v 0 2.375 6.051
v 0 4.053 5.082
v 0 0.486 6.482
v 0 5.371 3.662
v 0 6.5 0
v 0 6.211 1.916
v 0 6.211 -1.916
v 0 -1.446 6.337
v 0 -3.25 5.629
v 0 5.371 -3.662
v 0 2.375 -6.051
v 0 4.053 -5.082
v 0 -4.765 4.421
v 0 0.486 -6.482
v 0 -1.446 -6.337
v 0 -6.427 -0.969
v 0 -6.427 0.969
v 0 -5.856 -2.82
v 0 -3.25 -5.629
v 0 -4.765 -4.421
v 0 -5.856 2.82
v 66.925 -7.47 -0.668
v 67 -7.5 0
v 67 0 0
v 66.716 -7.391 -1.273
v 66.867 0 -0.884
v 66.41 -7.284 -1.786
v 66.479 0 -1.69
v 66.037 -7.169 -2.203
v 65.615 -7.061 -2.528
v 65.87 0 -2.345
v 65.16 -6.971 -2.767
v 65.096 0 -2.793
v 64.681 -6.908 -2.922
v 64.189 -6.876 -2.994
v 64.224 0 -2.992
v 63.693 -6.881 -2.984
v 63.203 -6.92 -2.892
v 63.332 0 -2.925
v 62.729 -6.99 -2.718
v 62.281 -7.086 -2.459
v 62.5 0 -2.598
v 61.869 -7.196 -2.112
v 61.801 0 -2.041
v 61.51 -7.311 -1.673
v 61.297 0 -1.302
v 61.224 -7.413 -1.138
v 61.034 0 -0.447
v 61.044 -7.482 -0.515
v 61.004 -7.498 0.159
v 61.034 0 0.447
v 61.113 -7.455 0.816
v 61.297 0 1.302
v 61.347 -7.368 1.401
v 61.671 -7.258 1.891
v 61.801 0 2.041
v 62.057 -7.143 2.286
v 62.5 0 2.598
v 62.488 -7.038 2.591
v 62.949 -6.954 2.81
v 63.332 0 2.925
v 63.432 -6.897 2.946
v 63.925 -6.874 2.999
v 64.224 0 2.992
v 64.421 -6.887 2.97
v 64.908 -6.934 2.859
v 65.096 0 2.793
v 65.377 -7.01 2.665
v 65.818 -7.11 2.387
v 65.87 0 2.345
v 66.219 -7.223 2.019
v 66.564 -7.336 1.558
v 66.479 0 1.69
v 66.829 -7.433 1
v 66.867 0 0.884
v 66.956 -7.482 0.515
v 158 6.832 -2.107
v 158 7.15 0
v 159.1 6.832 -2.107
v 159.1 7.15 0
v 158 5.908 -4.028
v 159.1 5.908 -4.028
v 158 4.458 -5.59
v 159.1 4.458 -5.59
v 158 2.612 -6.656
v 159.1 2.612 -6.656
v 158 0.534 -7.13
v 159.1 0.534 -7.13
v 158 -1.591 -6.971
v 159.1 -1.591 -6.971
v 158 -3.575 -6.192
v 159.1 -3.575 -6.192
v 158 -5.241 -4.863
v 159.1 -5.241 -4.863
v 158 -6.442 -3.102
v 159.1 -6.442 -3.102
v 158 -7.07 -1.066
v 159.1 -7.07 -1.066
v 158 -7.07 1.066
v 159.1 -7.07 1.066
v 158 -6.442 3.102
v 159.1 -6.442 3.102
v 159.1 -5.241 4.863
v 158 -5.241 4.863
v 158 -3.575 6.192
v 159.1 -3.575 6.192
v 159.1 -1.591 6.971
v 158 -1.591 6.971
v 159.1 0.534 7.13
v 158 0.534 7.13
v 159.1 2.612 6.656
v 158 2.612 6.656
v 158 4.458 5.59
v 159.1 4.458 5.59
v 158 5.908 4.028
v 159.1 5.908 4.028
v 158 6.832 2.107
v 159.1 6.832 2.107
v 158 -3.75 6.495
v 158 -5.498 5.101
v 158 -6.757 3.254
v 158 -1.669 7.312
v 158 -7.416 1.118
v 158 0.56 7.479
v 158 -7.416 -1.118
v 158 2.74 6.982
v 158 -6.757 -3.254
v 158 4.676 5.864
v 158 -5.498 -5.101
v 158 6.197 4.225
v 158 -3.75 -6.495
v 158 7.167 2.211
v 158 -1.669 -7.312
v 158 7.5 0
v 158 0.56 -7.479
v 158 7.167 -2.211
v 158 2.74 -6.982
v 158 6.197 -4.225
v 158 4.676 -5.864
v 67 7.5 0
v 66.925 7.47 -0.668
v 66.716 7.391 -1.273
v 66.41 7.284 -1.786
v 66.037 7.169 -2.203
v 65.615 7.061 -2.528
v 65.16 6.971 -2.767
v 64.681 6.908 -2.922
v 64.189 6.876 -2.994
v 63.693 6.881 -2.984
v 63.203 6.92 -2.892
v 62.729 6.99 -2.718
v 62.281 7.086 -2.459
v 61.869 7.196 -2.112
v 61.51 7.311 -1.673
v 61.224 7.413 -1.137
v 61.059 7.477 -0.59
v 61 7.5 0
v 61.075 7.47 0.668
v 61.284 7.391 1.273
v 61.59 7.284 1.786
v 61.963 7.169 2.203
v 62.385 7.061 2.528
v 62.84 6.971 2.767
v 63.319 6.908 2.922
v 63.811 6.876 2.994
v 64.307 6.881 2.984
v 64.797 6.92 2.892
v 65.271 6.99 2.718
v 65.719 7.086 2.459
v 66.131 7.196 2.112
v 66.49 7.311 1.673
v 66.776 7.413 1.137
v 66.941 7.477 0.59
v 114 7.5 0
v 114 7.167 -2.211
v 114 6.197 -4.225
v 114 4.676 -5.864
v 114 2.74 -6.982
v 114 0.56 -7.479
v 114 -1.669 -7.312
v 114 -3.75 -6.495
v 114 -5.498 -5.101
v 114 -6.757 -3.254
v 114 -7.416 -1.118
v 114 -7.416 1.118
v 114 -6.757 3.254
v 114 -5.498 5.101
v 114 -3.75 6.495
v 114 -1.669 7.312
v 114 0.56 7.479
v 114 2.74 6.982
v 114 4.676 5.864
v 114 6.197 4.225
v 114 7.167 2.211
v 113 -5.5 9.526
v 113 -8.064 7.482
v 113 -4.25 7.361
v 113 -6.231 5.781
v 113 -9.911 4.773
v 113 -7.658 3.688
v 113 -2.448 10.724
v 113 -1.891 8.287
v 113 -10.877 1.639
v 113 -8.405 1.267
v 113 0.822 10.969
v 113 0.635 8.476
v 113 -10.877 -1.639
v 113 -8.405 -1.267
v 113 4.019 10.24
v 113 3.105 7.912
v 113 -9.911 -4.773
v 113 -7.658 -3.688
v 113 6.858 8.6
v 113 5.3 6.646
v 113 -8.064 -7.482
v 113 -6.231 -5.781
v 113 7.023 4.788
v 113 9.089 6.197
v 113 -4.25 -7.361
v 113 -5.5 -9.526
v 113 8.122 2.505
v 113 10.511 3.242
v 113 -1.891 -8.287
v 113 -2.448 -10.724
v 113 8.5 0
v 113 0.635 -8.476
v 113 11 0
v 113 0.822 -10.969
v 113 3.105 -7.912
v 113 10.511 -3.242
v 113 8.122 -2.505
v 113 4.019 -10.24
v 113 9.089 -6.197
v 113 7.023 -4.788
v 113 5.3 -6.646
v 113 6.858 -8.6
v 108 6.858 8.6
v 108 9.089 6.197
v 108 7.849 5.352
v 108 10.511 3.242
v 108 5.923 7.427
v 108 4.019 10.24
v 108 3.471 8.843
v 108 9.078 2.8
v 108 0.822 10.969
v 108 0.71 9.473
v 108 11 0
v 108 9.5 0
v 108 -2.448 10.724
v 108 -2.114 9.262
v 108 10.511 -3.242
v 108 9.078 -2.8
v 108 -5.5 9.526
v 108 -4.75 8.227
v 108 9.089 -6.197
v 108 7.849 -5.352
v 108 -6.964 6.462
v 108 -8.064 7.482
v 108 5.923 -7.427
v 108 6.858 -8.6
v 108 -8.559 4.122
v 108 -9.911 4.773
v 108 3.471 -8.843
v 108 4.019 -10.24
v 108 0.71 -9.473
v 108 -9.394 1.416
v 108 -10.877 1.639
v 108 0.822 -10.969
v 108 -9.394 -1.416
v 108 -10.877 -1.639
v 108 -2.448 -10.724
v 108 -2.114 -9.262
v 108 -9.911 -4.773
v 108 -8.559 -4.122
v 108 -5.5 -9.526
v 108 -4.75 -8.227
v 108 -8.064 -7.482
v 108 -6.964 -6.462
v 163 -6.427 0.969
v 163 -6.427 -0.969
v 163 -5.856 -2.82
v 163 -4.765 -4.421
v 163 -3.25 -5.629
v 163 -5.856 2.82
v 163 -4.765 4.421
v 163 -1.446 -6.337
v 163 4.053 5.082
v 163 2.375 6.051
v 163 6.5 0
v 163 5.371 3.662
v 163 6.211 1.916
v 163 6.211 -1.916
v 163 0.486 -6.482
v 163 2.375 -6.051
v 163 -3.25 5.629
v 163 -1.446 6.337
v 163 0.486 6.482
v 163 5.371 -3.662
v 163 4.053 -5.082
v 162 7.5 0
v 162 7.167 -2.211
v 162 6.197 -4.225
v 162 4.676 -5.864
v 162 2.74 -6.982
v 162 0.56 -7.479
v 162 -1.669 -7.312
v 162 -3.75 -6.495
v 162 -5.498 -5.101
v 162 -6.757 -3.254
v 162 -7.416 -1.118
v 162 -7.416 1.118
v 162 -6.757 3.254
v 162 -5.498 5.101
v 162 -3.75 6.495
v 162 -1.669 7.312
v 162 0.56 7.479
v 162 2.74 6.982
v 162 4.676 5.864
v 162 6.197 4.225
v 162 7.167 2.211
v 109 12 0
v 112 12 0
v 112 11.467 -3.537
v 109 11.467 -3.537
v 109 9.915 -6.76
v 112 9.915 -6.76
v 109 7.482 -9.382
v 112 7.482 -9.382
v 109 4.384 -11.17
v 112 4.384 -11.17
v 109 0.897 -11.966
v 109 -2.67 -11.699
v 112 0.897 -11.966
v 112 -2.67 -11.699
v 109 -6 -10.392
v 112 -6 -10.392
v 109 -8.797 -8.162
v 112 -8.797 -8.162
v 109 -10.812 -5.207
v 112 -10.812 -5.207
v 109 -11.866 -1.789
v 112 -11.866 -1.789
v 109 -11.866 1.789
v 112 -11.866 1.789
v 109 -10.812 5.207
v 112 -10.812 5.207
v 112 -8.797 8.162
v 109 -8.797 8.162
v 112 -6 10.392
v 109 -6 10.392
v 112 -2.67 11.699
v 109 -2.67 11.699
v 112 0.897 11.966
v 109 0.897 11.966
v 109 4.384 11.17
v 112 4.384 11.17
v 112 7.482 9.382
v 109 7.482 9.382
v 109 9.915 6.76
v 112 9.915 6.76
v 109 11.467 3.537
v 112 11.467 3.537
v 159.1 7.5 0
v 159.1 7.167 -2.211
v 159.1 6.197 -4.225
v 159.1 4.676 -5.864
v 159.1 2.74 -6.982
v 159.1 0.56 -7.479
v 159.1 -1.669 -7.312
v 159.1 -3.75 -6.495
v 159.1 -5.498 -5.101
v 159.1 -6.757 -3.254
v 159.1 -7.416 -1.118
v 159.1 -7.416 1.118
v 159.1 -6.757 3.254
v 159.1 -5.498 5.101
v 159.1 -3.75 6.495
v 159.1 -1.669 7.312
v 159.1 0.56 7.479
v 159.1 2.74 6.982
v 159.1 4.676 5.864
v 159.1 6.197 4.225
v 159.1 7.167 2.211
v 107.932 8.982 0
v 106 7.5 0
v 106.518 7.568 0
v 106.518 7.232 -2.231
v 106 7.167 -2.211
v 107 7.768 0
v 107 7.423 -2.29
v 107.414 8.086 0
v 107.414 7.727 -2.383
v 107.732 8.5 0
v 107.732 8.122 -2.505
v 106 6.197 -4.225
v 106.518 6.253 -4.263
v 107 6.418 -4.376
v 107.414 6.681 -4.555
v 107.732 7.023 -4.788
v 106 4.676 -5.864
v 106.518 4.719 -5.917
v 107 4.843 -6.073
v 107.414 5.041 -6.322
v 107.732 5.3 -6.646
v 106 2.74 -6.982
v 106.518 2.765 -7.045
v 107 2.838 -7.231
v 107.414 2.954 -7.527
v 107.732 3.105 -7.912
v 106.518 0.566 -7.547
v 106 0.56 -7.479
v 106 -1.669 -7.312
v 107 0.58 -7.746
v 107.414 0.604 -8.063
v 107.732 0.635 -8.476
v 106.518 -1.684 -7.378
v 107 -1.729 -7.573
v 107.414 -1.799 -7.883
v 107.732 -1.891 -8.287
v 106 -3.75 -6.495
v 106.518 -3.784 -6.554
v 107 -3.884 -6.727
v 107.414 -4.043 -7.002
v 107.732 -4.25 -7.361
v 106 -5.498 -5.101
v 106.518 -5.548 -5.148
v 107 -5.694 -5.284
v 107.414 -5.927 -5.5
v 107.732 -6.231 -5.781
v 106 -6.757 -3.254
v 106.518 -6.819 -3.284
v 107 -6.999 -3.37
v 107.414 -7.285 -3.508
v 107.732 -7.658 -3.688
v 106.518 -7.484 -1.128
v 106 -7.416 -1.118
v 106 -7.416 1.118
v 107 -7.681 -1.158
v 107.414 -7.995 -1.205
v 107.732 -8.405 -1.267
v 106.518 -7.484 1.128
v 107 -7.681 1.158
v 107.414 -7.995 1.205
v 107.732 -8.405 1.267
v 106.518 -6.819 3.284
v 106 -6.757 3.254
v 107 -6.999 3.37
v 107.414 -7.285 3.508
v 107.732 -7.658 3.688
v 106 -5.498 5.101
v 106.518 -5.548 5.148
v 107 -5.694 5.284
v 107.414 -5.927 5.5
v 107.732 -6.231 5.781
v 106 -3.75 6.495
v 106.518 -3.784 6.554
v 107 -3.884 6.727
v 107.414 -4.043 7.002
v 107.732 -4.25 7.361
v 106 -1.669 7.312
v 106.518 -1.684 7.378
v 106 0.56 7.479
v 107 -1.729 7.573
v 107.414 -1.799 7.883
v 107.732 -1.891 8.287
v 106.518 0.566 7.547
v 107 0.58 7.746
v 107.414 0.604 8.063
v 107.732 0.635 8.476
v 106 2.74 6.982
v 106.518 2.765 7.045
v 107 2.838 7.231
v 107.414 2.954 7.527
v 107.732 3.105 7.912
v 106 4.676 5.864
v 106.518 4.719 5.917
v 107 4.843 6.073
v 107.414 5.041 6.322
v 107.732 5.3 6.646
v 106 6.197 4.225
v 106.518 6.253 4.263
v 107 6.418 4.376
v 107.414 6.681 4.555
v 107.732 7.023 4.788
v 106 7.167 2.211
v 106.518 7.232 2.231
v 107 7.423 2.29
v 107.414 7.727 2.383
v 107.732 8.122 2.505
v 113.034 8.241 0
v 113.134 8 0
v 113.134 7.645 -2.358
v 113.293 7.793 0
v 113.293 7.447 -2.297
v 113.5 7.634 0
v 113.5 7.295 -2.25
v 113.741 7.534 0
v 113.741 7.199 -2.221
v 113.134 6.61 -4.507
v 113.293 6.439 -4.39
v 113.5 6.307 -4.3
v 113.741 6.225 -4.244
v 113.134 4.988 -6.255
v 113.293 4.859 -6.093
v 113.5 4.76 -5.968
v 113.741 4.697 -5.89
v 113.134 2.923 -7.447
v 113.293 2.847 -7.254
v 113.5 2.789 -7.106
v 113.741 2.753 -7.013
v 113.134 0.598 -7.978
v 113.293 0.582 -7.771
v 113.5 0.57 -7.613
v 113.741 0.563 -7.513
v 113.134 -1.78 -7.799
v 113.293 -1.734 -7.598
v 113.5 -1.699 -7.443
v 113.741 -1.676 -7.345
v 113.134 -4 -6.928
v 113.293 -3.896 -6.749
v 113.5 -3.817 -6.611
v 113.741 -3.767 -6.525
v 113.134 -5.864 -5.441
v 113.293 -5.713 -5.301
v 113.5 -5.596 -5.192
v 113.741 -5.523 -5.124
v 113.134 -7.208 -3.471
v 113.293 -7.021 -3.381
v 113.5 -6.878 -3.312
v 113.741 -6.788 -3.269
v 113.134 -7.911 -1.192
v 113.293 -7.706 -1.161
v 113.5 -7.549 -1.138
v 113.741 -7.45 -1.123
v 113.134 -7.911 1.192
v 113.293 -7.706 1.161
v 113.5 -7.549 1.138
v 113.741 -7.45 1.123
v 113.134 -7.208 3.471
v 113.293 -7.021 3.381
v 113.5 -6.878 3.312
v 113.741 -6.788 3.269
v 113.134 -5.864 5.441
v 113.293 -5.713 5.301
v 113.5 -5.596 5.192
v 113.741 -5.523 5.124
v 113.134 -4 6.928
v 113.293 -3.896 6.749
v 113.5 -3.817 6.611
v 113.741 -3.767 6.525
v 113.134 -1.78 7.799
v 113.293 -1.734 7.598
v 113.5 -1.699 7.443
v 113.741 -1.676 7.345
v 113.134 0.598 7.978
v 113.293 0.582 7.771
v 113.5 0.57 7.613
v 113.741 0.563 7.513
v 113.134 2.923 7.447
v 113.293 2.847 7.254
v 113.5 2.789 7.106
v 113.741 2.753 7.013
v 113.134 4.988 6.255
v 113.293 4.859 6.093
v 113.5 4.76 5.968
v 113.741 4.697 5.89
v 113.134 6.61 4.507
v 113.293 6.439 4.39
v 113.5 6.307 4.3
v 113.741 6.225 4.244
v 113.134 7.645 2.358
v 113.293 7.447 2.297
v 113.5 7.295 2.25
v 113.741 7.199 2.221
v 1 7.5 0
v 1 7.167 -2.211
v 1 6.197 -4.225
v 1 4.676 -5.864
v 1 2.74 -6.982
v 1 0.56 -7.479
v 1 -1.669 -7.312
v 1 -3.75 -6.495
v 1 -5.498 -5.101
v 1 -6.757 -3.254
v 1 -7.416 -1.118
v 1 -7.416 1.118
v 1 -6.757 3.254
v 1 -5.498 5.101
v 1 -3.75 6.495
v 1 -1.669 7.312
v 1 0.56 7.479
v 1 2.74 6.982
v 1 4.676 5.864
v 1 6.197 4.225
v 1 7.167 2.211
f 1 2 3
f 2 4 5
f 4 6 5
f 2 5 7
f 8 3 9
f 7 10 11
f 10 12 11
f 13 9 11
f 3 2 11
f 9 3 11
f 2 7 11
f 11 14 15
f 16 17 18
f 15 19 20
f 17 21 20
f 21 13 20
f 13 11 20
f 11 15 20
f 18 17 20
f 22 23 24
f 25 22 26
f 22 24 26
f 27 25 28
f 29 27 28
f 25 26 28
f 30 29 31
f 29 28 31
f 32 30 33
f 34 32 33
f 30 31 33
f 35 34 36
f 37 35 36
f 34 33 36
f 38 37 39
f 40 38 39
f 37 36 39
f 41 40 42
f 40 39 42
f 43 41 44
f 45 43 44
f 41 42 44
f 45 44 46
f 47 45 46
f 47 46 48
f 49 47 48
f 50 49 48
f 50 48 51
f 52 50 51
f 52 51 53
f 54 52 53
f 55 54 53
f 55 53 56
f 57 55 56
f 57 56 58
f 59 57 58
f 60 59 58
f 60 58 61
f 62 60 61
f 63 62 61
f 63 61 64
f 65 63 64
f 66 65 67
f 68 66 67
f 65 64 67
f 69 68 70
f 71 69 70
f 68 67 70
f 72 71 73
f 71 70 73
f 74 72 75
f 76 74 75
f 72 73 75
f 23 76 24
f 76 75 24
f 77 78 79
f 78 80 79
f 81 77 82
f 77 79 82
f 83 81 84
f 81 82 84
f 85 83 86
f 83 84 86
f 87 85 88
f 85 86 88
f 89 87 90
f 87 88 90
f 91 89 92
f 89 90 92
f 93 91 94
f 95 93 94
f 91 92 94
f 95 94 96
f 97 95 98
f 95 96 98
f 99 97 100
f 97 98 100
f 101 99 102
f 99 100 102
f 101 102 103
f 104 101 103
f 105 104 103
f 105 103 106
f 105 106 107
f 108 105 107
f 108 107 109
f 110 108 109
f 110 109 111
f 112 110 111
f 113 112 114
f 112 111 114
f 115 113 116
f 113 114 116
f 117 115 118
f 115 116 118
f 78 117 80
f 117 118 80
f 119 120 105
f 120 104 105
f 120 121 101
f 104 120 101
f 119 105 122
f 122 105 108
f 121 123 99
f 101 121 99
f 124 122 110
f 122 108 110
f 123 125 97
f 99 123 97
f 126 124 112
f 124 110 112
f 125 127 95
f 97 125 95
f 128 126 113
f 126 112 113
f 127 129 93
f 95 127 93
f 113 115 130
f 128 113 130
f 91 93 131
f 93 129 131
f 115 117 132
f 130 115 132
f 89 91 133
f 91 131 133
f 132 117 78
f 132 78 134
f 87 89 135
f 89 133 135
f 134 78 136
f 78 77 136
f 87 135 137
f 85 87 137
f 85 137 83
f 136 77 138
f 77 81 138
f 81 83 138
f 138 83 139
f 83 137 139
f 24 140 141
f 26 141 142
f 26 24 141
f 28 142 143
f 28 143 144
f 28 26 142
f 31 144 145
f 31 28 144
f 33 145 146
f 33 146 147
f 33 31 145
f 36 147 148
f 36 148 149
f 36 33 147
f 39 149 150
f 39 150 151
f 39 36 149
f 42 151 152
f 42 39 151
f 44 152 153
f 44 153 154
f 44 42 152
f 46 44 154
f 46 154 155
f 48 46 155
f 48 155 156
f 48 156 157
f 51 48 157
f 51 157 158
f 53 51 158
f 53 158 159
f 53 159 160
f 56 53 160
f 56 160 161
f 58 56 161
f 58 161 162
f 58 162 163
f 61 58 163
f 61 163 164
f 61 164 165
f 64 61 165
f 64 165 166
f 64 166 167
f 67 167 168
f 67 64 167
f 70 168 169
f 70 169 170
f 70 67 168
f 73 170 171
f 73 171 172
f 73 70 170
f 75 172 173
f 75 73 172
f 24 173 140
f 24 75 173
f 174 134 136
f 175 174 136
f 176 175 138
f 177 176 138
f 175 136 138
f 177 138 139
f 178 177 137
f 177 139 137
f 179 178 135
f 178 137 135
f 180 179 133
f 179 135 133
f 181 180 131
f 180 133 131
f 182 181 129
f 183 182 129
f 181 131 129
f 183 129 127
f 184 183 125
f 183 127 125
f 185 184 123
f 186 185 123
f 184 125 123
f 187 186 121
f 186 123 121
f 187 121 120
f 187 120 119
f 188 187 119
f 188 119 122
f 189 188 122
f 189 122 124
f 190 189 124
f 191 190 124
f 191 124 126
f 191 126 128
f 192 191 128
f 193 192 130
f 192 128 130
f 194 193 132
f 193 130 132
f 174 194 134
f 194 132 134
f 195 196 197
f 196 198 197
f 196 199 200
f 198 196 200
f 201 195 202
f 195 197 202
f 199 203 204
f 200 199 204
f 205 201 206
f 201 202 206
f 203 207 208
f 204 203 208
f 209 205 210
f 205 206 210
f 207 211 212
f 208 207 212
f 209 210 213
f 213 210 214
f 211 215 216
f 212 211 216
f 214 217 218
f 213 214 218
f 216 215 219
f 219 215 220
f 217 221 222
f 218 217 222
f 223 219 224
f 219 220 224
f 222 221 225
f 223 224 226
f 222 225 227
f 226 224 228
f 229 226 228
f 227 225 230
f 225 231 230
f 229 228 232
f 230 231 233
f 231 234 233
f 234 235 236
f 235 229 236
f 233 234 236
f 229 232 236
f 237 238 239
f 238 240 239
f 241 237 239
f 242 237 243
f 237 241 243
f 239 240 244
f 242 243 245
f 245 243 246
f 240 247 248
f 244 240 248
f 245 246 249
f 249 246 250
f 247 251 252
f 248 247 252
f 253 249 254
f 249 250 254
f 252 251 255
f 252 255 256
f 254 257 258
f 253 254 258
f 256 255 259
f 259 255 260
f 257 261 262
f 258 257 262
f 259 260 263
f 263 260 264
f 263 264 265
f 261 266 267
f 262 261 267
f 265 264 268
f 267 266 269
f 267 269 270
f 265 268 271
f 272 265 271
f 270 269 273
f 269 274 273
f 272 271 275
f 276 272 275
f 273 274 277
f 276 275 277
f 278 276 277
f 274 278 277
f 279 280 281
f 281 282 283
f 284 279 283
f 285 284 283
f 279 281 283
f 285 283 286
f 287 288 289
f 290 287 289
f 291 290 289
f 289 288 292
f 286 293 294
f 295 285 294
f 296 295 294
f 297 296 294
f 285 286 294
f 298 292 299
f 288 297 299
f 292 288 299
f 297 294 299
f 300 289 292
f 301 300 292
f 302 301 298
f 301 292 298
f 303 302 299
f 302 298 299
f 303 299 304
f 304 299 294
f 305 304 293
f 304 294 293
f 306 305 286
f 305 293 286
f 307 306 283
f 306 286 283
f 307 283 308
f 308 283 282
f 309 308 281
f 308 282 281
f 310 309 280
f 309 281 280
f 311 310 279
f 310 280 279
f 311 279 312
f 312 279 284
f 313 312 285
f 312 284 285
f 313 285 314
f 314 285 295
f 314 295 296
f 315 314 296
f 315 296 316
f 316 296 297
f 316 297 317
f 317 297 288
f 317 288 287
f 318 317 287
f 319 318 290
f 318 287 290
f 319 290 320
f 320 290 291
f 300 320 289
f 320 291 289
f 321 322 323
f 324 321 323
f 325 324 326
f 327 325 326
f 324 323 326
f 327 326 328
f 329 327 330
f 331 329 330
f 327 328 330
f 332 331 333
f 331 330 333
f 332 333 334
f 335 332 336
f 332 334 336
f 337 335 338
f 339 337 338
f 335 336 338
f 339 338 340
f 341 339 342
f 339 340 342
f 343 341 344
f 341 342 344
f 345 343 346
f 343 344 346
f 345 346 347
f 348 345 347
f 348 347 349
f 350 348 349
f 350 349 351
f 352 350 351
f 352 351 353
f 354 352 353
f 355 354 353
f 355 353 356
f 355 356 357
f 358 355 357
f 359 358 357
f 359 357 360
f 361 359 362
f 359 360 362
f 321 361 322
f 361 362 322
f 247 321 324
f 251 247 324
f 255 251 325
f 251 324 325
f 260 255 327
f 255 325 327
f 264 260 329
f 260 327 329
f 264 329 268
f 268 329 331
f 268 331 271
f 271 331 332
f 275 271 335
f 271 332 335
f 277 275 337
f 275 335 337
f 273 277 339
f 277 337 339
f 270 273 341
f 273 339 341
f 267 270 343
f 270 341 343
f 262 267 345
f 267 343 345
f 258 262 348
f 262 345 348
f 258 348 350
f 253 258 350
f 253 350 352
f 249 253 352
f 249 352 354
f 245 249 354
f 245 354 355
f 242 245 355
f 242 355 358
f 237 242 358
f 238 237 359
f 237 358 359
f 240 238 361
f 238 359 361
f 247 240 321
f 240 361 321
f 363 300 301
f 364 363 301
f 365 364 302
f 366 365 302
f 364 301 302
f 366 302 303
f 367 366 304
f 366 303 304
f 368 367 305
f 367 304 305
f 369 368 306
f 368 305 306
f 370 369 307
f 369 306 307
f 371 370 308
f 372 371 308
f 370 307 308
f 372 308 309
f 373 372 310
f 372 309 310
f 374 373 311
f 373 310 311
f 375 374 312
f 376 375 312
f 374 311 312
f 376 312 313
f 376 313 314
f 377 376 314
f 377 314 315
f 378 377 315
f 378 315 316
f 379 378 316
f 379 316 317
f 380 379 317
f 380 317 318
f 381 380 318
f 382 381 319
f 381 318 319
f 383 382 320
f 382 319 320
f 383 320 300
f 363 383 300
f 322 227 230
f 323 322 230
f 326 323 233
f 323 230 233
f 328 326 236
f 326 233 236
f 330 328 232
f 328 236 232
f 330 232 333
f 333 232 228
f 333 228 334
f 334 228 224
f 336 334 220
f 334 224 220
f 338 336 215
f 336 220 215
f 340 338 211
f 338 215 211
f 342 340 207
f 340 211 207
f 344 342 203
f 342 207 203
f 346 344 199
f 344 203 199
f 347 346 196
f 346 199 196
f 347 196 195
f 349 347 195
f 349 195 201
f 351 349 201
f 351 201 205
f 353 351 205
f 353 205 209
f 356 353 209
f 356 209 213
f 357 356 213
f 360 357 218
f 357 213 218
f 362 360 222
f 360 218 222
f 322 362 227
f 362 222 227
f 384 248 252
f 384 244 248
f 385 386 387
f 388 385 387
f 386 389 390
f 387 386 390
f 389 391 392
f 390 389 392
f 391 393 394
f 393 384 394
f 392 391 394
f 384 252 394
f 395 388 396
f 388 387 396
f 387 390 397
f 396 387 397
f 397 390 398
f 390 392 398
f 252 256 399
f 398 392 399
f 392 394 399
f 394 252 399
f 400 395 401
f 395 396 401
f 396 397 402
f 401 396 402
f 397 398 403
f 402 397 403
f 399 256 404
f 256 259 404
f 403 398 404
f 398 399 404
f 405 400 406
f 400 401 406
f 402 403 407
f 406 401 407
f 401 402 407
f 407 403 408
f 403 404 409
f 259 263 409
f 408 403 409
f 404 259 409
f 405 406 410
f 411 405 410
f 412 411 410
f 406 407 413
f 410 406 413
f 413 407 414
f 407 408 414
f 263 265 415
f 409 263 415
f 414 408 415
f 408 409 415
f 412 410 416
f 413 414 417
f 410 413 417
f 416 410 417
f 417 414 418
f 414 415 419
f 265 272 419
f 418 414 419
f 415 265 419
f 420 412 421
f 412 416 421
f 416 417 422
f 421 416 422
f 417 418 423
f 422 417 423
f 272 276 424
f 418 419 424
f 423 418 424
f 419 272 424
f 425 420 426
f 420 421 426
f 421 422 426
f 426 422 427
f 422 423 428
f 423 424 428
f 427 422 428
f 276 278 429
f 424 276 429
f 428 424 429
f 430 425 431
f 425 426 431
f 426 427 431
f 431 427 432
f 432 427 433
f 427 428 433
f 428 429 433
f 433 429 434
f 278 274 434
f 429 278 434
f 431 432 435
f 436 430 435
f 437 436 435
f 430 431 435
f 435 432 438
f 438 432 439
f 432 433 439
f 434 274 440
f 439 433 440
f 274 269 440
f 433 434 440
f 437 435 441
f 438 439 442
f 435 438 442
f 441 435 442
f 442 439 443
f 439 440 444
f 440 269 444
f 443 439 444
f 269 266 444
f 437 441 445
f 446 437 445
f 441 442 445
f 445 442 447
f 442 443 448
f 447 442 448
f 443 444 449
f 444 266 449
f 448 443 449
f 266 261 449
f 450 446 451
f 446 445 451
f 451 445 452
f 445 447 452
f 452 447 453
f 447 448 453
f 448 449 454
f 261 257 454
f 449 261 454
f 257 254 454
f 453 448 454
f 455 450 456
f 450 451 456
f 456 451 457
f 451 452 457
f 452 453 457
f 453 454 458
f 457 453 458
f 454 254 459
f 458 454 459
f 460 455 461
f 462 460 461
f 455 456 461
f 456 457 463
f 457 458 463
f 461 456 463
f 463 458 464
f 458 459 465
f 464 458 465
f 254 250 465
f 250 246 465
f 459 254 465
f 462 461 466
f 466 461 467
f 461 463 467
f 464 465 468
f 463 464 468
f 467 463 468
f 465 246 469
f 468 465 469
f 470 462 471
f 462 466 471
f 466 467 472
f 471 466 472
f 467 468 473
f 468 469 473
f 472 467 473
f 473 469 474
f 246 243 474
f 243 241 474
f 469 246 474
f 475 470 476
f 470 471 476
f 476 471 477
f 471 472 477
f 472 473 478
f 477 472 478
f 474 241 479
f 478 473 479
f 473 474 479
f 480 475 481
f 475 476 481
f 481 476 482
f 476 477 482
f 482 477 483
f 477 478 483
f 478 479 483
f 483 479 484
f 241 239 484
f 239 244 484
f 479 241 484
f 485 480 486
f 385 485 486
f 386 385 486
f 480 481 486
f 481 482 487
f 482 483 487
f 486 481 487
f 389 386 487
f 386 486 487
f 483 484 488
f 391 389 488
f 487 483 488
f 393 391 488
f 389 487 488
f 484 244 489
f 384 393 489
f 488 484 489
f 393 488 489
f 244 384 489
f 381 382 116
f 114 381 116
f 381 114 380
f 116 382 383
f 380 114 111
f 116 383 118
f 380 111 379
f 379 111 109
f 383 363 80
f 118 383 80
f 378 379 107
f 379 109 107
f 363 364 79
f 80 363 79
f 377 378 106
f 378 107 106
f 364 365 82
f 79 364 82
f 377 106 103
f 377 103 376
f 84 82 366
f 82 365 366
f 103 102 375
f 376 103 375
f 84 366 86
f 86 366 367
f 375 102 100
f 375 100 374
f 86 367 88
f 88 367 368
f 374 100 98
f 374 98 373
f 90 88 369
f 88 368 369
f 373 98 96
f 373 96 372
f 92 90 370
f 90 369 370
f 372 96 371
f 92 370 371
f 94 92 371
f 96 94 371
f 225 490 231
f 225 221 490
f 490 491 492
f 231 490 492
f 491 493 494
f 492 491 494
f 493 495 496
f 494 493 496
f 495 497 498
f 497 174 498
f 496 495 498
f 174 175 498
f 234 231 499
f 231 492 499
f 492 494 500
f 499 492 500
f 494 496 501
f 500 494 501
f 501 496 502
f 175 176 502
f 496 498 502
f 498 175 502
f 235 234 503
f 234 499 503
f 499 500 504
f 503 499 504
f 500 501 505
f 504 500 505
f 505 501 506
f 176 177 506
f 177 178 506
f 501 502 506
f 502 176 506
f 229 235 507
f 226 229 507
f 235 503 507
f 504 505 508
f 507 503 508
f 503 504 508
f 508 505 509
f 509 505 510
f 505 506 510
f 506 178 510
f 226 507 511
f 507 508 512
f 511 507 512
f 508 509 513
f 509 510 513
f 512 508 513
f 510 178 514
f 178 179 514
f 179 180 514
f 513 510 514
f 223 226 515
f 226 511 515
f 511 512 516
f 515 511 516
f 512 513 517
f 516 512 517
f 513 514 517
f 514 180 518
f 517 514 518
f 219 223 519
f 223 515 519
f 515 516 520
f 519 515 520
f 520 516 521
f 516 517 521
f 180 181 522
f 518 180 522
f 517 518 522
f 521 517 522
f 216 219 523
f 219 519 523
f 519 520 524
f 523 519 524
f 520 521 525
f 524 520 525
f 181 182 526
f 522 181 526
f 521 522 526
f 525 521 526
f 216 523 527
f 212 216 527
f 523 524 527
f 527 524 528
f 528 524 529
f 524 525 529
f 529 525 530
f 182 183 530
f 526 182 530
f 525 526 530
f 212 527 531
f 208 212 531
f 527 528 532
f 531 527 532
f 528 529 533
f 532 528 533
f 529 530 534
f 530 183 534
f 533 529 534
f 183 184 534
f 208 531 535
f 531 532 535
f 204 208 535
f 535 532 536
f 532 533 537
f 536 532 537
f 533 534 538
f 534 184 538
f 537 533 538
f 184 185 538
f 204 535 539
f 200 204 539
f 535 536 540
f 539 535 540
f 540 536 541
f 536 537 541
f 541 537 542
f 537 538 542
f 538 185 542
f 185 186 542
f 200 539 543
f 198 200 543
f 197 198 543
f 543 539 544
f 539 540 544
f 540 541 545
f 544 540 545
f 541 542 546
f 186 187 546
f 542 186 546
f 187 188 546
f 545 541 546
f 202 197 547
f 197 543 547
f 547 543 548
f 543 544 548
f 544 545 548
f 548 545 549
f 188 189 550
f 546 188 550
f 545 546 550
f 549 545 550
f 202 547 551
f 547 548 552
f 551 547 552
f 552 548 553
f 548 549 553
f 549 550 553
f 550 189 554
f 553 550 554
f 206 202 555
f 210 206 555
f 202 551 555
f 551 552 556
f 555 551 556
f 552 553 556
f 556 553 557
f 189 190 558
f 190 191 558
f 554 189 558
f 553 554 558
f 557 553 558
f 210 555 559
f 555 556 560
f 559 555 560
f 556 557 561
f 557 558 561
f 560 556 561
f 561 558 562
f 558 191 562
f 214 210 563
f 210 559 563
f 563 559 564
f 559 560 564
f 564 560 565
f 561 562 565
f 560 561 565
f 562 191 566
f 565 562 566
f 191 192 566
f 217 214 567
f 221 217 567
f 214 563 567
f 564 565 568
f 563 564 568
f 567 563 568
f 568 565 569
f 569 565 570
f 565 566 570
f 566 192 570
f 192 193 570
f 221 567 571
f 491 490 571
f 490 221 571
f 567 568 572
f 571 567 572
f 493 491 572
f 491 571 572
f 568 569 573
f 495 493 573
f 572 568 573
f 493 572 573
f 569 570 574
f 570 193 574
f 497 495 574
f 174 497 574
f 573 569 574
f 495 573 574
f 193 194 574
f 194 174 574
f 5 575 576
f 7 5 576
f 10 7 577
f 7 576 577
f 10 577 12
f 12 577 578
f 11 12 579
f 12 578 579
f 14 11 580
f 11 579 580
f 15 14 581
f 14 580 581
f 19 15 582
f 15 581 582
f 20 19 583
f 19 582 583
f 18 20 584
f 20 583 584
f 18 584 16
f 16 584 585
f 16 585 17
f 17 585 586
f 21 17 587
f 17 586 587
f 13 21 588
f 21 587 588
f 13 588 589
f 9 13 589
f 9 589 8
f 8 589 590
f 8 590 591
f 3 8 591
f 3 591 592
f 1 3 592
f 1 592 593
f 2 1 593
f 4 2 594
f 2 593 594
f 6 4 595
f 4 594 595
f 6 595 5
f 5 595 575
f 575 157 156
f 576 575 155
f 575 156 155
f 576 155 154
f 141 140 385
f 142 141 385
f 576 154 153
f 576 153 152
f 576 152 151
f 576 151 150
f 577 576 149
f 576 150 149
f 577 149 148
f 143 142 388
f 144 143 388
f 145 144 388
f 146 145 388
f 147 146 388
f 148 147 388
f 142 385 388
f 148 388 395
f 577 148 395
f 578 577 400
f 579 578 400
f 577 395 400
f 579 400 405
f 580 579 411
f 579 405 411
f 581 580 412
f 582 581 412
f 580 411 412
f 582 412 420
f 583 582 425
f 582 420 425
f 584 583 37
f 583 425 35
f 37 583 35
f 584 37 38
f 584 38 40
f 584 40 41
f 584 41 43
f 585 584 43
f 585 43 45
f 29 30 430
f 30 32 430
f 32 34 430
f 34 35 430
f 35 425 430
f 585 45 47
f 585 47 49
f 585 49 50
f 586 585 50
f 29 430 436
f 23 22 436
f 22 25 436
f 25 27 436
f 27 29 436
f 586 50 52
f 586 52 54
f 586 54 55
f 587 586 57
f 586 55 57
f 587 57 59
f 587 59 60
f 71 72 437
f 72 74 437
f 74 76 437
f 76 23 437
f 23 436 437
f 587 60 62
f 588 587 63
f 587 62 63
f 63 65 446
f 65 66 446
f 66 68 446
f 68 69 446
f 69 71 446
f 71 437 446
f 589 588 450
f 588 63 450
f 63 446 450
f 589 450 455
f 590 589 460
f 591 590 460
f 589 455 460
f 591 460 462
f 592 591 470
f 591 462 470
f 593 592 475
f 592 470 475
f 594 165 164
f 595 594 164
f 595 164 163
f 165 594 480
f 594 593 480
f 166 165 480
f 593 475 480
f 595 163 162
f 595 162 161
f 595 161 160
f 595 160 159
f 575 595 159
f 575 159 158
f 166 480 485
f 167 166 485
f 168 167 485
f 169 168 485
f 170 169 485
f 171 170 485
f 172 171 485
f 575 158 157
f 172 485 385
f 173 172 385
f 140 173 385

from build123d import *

# Parameters (mm, degrees)
CUT_EXTRUDE1_DEPTH      = 10
CUT_EXTRUDE1_DEPTH_BACK = 10
SKETCH2_R               = 3
CHAMFER1_SIZE           = 1
FILLET1_R               = 2
FILLET2_R               = 1


with BuildPart() as part:
    # Sketch1 → Revolve1 (revolve)
    with BuildSketch(Plane.XY):
        Polygon((0, 0), (0, 7.5), (108, 7.5), (108, 12), (113, 12), (113, 7.5), (158, 7.5), (158, 7.15), (159.1, 7.15), (159.1, 7.5), (163, 7.5), (163, 0), align=None)
    revolve(axis=Axis((0, 0, 0), (-1, 0, 0)))

    # Sketch2 → Cut-Extrude1 (cut, two sides: drawn at the far end of the back side and taken through both)
    with BuildSketch(Plane(origin=(0, 0, 0), x_dir=(1, 0, 0), z_dir=(0, 1, 0)).offset(-CUT_EXTRUDE1_DEPTH_BACK)):
        with Locations((64, 0)):
            Circle(SKETCH2_R)
    extrude(amount=CUT_EXTRUDE1_DEPTH + CUT_EXTRUDE1_DEPTH_BACK, mode=Mode.SUBTRACT)

    # Chamfer1
    chamfer1_edges = [part.edges().sort_by_distance(p)[0] for p in [
        (113, -12, 0),
        (108, -12, 0),
        (0, -7.5, 0),
        (163, -7.5, 0),
    ]]
    chamfer(chamfer1_edges, length=CHAMFER1_SIZE)

    # Fillet1
    fillet1_edges = [part.edges().sort_by_distance(p)[0] for p in [
        (108, -7.5, 0),
    ]]
    fillet(fillet1_edges, radius=FILLET1_R)

    # Fillet2
    fillet2_edges = [part.edges().sort_by_distance(p)[0] for p in [
        (113, -7.5, 0),
    ]]
    fillet(fillet2_edges, radius=FILLET2_R)


solid = part.part
